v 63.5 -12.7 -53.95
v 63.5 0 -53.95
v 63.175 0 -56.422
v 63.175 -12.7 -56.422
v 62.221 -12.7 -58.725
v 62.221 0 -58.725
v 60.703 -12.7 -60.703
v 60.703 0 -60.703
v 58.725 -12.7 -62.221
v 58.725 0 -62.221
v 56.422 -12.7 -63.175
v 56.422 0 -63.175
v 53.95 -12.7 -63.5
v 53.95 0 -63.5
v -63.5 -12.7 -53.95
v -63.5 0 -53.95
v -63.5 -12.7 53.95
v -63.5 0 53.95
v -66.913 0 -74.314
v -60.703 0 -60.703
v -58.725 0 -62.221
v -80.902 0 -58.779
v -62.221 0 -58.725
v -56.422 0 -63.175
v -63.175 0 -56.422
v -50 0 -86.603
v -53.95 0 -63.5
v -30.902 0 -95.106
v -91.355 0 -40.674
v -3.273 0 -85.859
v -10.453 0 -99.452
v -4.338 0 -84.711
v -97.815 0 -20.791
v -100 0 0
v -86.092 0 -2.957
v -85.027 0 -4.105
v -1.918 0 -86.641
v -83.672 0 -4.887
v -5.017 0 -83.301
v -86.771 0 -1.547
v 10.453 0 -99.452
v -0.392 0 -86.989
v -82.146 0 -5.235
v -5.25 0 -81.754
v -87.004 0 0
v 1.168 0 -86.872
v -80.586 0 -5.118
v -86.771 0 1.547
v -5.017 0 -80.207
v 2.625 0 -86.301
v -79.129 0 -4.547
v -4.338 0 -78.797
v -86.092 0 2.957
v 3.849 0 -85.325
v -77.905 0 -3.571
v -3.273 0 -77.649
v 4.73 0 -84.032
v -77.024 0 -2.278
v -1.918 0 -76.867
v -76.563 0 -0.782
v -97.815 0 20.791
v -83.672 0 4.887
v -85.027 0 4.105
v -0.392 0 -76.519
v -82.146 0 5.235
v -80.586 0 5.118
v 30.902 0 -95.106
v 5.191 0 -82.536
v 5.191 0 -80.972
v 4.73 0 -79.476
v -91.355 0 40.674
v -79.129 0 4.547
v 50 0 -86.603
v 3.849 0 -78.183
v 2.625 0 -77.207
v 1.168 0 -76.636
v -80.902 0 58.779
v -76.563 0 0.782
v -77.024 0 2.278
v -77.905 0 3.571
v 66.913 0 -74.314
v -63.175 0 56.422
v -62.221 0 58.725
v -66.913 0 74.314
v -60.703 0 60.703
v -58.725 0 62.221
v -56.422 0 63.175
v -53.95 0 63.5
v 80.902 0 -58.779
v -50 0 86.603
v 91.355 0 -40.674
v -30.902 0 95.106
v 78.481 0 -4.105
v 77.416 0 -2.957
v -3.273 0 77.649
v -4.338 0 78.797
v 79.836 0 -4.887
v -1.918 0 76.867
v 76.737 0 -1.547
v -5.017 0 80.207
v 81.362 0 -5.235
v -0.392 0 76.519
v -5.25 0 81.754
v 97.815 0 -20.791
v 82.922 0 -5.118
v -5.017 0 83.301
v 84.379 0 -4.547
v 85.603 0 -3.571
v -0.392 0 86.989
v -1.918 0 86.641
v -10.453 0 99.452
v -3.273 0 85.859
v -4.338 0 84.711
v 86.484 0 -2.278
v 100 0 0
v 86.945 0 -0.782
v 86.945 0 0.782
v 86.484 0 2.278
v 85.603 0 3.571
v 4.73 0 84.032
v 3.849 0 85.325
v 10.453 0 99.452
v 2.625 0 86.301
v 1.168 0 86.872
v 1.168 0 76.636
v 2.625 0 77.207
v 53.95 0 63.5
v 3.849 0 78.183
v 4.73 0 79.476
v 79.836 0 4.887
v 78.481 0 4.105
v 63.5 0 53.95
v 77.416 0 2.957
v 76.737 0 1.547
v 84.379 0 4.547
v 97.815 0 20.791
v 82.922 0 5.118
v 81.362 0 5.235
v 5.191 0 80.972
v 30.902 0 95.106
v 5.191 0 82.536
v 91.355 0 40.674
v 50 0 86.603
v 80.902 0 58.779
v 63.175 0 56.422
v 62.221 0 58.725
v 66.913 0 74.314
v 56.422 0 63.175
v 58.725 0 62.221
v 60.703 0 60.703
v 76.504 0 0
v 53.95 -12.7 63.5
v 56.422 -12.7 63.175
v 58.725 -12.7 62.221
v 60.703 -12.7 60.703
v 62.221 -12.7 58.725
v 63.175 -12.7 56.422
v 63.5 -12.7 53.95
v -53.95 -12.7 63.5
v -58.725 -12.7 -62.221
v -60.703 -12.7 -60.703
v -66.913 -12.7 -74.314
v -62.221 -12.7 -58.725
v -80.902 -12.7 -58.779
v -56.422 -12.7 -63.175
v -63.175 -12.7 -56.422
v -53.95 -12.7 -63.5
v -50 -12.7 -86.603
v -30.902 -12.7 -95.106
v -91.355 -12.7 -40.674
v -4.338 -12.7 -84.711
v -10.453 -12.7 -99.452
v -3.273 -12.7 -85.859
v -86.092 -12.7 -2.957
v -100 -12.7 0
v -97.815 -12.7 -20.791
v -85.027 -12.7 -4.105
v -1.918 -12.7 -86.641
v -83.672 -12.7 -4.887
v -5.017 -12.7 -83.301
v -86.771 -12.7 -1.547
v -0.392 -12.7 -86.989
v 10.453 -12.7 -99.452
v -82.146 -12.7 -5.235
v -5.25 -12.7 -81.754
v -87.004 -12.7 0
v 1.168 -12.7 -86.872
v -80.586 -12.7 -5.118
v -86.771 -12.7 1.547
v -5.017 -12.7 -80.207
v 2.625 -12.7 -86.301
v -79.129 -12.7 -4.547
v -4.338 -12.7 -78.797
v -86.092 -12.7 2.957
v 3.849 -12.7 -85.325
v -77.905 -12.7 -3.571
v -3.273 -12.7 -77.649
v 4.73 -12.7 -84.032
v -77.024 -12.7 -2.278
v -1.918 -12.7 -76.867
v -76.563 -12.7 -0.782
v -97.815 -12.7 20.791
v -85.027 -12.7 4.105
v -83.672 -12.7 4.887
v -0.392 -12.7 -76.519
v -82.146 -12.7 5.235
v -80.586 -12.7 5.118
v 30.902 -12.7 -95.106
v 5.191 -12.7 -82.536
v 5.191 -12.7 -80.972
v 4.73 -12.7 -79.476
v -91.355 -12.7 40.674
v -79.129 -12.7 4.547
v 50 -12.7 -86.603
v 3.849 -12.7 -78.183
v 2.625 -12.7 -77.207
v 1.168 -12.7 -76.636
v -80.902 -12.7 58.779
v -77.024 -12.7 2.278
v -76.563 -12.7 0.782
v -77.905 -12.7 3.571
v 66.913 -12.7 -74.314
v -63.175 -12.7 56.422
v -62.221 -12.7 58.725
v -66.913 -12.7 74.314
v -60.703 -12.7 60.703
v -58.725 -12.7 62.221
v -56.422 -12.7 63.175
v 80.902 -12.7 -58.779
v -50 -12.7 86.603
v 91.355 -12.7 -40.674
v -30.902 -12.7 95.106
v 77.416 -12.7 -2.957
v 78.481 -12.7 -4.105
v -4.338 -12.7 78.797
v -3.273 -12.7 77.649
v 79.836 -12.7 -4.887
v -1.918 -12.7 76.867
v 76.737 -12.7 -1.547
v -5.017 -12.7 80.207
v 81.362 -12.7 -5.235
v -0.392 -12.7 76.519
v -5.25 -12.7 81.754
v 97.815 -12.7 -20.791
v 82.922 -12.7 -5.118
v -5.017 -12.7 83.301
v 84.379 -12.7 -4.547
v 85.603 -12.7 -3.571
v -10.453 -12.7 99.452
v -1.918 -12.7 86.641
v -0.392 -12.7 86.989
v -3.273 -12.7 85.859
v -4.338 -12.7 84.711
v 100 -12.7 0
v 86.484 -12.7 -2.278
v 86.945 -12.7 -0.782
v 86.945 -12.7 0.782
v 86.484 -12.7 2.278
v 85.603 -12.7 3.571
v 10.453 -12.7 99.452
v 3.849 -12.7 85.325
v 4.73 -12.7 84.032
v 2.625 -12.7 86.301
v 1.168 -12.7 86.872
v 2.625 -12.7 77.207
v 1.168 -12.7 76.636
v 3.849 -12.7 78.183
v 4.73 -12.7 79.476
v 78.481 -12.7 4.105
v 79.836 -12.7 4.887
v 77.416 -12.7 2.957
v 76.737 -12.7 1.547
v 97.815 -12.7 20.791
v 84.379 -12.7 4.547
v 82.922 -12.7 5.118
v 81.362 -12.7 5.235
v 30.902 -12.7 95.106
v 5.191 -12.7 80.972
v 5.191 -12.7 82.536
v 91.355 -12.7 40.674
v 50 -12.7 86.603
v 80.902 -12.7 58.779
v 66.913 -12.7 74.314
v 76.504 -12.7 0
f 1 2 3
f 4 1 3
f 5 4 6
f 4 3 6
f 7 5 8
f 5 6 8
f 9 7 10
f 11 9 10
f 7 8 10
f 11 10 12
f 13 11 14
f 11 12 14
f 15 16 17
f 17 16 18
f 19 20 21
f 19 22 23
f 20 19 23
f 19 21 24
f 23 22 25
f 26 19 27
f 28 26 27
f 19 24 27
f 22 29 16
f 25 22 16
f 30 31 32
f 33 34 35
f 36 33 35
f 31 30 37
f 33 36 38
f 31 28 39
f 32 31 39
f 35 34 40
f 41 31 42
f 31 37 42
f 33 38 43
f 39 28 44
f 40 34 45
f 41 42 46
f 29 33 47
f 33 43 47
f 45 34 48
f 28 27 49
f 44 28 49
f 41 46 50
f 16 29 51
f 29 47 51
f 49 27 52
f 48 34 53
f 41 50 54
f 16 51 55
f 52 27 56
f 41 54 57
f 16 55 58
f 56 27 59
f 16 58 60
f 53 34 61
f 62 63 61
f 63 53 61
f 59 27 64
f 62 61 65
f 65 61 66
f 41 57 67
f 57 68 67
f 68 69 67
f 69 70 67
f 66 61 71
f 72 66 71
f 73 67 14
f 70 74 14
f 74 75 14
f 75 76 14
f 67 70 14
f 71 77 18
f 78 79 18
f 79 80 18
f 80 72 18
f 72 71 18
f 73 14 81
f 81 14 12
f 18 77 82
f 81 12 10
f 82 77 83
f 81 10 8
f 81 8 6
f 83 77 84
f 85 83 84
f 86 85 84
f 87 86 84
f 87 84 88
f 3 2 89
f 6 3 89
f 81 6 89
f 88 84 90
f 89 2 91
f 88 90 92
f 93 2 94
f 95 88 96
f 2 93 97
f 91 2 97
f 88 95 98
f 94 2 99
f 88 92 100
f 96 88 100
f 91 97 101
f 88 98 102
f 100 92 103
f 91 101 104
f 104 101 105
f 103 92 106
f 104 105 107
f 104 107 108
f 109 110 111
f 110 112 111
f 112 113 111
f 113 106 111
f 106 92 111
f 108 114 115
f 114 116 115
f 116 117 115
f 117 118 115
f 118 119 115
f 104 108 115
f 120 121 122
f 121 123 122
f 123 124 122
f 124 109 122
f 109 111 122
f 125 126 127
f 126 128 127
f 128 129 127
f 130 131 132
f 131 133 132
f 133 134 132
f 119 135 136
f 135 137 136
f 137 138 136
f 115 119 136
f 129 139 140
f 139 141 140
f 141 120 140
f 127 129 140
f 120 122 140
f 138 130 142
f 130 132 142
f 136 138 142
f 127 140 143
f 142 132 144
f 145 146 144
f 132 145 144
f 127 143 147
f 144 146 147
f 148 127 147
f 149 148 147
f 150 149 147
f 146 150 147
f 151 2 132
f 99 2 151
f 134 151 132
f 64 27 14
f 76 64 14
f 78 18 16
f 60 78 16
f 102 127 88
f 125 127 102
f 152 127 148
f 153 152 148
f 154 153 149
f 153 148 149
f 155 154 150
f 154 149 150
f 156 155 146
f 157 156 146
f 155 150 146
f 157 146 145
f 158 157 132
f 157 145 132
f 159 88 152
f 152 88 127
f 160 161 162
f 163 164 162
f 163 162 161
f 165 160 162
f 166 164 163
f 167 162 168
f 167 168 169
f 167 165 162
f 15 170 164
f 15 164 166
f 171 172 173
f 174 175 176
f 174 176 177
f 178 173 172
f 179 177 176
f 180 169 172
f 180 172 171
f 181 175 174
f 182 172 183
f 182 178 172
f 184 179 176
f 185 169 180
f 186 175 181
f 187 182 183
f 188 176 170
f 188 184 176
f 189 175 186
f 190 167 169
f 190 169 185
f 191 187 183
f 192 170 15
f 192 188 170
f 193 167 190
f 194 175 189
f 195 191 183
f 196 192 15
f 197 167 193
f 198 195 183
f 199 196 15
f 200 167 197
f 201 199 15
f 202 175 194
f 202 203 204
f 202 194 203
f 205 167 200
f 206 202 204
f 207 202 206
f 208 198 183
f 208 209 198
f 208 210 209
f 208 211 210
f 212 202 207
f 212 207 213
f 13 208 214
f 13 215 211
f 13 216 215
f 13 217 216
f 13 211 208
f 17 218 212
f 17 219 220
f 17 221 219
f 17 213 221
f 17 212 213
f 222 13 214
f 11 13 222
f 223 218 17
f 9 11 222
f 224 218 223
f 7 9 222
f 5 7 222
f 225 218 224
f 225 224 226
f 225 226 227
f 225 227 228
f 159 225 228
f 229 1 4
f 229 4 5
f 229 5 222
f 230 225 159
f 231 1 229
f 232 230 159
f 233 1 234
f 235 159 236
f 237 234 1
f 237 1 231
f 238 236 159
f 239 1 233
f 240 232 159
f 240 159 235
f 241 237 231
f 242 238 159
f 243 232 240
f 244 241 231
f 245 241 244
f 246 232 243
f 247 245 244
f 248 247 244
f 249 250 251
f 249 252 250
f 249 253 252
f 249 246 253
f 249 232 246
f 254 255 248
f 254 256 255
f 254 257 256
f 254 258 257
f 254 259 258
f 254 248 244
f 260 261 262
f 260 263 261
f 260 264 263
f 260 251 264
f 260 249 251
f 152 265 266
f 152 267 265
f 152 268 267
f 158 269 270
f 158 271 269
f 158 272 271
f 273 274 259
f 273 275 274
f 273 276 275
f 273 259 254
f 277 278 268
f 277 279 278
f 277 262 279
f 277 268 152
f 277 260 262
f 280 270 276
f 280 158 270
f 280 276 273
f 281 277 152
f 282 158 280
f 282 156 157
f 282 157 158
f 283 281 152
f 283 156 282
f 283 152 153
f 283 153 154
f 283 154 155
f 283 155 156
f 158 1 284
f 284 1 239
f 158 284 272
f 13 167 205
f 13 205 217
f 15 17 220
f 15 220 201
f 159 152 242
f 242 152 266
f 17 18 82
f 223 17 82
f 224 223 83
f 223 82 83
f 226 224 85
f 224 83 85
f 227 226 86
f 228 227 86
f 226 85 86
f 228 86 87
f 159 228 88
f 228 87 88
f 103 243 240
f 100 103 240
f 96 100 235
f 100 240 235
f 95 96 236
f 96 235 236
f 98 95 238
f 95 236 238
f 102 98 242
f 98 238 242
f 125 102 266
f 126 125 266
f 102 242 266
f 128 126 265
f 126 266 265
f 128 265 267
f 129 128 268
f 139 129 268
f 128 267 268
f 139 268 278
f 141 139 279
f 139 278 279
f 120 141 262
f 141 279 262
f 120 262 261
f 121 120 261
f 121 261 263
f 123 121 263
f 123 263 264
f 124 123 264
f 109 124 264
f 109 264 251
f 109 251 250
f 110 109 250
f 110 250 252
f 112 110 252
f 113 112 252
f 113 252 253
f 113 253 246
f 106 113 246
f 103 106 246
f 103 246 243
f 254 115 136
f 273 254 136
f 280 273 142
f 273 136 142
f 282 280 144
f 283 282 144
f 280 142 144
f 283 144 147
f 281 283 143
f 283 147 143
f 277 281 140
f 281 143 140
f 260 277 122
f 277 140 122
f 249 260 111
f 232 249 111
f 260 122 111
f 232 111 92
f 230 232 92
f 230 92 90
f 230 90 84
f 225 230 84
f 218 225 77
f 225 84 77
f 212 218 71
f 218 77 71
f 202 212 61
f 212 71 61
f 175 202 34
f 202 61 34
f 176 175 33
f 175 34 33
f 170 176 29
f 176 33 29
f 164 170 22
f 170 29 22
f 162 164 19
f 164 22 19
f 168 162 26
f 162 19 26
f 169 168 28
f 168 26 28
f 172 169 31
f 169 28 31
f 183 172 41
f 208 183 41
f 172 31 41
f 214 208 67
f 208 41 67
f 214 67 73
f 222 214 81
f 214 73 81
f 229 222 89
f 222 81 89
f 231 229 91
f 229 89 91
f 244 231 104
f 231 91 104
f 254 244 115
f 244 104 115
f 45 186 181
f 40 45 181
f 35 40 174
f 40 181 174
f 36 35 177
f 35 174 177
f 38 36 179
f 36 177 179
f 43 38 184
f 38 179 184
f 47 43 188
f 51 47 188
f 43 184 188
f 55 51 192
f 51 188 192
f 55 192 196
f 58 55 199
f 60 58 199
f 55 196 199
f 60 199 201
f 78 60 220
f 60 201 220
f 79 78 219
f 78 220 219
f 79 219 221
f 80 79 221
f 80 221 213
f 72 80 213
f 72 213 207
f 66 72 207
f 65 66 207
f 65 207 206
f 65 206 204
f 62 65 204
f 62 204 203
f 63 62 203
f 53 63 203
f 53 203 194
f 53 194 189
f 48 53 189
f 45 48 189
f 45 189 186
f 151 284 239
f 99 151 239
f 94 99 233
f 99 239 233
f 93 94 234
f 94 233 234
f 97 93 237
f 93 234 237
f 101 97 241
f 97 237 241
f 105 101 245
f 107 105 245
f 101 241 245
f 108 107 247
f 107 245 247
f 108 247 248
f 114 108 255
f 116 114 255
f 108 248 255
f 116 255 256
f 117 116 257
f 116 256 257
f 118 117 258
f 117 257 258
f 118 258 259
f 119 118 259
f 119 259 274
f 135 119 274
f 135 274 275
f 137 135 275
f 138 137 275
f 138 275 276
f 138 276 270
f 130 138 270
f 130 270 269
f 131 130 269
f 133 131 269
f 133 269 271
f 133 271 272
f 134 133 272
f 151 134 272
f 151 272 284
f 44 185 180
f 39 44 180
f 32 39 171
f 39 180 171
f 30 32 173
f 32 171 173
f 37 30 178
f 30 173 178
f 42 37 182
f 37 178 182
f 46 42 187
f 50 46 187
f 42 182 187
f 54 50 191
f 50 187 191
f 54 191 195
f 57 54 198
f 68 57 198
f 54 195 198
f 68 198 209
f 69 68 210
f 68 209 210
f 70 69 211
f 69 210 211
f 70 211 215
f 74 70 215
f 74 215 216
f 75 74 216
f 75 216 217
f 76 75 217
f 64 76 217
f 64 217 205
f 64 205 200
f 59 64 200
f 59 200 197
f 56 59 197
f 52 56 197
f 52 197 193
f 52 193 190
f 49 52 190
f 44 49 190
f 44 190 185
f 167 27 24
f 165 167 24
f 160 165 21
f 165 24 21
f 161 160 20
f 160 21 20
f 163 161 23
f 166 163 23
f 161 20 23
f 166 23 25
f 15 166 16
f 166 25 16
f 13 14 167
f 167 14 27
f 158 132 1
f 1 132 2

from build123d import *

# Parameters (mm, degrees)
F0_R     = 100
F1_DEPTH = 12.7
F2_D     = 10.5


with BuildPart() as f1:
    # F0 (on Front) → F1 (new body)
    with BuildSketch(Plane.XZ):
        Circle(F0_R)
        with BuildLine():
            ThreePointArc((63.5, -53.95), (60.7028697603, -60.7028697603), (53.95, -63.5))
            Line((53.95, -63.5), (-53.95, -63.5))
            ThreePointArc((-53.95, -63.5), (-60.7028697603, -60.7028697603), (-63.5, -53.95))
            Line((-63.5, -53.95), (-63.5, 53.95))
            ThreePointArc((-63.5, 53.95), (-60.7028697603, 60.7028697603), (-53.95, 63.5))
            Line((-53.95, 63.5), (53.95, 63.5))
            ThreePointArc((53.95, 63.5), (60.7028697603, 60.7028697603), (63.5, 53.95))
            Line((63.5, 53.95), (63.5, -53.95))
        make_face(mode=Mode.SUBTRACT)
    extrude(amount=F1_DEPTH)

    # F2 (through all)
    with Locations(Plane(origin=(0, 0, 0), x_dir=(1, 0, 0), z_dir=(0, 1, 0))):
        with Locations((0, -81.754), (81.754, 0), (0, 81.754), (-81.754, 0)):
            Hole(F2_D / 2)


solid = f1.part
